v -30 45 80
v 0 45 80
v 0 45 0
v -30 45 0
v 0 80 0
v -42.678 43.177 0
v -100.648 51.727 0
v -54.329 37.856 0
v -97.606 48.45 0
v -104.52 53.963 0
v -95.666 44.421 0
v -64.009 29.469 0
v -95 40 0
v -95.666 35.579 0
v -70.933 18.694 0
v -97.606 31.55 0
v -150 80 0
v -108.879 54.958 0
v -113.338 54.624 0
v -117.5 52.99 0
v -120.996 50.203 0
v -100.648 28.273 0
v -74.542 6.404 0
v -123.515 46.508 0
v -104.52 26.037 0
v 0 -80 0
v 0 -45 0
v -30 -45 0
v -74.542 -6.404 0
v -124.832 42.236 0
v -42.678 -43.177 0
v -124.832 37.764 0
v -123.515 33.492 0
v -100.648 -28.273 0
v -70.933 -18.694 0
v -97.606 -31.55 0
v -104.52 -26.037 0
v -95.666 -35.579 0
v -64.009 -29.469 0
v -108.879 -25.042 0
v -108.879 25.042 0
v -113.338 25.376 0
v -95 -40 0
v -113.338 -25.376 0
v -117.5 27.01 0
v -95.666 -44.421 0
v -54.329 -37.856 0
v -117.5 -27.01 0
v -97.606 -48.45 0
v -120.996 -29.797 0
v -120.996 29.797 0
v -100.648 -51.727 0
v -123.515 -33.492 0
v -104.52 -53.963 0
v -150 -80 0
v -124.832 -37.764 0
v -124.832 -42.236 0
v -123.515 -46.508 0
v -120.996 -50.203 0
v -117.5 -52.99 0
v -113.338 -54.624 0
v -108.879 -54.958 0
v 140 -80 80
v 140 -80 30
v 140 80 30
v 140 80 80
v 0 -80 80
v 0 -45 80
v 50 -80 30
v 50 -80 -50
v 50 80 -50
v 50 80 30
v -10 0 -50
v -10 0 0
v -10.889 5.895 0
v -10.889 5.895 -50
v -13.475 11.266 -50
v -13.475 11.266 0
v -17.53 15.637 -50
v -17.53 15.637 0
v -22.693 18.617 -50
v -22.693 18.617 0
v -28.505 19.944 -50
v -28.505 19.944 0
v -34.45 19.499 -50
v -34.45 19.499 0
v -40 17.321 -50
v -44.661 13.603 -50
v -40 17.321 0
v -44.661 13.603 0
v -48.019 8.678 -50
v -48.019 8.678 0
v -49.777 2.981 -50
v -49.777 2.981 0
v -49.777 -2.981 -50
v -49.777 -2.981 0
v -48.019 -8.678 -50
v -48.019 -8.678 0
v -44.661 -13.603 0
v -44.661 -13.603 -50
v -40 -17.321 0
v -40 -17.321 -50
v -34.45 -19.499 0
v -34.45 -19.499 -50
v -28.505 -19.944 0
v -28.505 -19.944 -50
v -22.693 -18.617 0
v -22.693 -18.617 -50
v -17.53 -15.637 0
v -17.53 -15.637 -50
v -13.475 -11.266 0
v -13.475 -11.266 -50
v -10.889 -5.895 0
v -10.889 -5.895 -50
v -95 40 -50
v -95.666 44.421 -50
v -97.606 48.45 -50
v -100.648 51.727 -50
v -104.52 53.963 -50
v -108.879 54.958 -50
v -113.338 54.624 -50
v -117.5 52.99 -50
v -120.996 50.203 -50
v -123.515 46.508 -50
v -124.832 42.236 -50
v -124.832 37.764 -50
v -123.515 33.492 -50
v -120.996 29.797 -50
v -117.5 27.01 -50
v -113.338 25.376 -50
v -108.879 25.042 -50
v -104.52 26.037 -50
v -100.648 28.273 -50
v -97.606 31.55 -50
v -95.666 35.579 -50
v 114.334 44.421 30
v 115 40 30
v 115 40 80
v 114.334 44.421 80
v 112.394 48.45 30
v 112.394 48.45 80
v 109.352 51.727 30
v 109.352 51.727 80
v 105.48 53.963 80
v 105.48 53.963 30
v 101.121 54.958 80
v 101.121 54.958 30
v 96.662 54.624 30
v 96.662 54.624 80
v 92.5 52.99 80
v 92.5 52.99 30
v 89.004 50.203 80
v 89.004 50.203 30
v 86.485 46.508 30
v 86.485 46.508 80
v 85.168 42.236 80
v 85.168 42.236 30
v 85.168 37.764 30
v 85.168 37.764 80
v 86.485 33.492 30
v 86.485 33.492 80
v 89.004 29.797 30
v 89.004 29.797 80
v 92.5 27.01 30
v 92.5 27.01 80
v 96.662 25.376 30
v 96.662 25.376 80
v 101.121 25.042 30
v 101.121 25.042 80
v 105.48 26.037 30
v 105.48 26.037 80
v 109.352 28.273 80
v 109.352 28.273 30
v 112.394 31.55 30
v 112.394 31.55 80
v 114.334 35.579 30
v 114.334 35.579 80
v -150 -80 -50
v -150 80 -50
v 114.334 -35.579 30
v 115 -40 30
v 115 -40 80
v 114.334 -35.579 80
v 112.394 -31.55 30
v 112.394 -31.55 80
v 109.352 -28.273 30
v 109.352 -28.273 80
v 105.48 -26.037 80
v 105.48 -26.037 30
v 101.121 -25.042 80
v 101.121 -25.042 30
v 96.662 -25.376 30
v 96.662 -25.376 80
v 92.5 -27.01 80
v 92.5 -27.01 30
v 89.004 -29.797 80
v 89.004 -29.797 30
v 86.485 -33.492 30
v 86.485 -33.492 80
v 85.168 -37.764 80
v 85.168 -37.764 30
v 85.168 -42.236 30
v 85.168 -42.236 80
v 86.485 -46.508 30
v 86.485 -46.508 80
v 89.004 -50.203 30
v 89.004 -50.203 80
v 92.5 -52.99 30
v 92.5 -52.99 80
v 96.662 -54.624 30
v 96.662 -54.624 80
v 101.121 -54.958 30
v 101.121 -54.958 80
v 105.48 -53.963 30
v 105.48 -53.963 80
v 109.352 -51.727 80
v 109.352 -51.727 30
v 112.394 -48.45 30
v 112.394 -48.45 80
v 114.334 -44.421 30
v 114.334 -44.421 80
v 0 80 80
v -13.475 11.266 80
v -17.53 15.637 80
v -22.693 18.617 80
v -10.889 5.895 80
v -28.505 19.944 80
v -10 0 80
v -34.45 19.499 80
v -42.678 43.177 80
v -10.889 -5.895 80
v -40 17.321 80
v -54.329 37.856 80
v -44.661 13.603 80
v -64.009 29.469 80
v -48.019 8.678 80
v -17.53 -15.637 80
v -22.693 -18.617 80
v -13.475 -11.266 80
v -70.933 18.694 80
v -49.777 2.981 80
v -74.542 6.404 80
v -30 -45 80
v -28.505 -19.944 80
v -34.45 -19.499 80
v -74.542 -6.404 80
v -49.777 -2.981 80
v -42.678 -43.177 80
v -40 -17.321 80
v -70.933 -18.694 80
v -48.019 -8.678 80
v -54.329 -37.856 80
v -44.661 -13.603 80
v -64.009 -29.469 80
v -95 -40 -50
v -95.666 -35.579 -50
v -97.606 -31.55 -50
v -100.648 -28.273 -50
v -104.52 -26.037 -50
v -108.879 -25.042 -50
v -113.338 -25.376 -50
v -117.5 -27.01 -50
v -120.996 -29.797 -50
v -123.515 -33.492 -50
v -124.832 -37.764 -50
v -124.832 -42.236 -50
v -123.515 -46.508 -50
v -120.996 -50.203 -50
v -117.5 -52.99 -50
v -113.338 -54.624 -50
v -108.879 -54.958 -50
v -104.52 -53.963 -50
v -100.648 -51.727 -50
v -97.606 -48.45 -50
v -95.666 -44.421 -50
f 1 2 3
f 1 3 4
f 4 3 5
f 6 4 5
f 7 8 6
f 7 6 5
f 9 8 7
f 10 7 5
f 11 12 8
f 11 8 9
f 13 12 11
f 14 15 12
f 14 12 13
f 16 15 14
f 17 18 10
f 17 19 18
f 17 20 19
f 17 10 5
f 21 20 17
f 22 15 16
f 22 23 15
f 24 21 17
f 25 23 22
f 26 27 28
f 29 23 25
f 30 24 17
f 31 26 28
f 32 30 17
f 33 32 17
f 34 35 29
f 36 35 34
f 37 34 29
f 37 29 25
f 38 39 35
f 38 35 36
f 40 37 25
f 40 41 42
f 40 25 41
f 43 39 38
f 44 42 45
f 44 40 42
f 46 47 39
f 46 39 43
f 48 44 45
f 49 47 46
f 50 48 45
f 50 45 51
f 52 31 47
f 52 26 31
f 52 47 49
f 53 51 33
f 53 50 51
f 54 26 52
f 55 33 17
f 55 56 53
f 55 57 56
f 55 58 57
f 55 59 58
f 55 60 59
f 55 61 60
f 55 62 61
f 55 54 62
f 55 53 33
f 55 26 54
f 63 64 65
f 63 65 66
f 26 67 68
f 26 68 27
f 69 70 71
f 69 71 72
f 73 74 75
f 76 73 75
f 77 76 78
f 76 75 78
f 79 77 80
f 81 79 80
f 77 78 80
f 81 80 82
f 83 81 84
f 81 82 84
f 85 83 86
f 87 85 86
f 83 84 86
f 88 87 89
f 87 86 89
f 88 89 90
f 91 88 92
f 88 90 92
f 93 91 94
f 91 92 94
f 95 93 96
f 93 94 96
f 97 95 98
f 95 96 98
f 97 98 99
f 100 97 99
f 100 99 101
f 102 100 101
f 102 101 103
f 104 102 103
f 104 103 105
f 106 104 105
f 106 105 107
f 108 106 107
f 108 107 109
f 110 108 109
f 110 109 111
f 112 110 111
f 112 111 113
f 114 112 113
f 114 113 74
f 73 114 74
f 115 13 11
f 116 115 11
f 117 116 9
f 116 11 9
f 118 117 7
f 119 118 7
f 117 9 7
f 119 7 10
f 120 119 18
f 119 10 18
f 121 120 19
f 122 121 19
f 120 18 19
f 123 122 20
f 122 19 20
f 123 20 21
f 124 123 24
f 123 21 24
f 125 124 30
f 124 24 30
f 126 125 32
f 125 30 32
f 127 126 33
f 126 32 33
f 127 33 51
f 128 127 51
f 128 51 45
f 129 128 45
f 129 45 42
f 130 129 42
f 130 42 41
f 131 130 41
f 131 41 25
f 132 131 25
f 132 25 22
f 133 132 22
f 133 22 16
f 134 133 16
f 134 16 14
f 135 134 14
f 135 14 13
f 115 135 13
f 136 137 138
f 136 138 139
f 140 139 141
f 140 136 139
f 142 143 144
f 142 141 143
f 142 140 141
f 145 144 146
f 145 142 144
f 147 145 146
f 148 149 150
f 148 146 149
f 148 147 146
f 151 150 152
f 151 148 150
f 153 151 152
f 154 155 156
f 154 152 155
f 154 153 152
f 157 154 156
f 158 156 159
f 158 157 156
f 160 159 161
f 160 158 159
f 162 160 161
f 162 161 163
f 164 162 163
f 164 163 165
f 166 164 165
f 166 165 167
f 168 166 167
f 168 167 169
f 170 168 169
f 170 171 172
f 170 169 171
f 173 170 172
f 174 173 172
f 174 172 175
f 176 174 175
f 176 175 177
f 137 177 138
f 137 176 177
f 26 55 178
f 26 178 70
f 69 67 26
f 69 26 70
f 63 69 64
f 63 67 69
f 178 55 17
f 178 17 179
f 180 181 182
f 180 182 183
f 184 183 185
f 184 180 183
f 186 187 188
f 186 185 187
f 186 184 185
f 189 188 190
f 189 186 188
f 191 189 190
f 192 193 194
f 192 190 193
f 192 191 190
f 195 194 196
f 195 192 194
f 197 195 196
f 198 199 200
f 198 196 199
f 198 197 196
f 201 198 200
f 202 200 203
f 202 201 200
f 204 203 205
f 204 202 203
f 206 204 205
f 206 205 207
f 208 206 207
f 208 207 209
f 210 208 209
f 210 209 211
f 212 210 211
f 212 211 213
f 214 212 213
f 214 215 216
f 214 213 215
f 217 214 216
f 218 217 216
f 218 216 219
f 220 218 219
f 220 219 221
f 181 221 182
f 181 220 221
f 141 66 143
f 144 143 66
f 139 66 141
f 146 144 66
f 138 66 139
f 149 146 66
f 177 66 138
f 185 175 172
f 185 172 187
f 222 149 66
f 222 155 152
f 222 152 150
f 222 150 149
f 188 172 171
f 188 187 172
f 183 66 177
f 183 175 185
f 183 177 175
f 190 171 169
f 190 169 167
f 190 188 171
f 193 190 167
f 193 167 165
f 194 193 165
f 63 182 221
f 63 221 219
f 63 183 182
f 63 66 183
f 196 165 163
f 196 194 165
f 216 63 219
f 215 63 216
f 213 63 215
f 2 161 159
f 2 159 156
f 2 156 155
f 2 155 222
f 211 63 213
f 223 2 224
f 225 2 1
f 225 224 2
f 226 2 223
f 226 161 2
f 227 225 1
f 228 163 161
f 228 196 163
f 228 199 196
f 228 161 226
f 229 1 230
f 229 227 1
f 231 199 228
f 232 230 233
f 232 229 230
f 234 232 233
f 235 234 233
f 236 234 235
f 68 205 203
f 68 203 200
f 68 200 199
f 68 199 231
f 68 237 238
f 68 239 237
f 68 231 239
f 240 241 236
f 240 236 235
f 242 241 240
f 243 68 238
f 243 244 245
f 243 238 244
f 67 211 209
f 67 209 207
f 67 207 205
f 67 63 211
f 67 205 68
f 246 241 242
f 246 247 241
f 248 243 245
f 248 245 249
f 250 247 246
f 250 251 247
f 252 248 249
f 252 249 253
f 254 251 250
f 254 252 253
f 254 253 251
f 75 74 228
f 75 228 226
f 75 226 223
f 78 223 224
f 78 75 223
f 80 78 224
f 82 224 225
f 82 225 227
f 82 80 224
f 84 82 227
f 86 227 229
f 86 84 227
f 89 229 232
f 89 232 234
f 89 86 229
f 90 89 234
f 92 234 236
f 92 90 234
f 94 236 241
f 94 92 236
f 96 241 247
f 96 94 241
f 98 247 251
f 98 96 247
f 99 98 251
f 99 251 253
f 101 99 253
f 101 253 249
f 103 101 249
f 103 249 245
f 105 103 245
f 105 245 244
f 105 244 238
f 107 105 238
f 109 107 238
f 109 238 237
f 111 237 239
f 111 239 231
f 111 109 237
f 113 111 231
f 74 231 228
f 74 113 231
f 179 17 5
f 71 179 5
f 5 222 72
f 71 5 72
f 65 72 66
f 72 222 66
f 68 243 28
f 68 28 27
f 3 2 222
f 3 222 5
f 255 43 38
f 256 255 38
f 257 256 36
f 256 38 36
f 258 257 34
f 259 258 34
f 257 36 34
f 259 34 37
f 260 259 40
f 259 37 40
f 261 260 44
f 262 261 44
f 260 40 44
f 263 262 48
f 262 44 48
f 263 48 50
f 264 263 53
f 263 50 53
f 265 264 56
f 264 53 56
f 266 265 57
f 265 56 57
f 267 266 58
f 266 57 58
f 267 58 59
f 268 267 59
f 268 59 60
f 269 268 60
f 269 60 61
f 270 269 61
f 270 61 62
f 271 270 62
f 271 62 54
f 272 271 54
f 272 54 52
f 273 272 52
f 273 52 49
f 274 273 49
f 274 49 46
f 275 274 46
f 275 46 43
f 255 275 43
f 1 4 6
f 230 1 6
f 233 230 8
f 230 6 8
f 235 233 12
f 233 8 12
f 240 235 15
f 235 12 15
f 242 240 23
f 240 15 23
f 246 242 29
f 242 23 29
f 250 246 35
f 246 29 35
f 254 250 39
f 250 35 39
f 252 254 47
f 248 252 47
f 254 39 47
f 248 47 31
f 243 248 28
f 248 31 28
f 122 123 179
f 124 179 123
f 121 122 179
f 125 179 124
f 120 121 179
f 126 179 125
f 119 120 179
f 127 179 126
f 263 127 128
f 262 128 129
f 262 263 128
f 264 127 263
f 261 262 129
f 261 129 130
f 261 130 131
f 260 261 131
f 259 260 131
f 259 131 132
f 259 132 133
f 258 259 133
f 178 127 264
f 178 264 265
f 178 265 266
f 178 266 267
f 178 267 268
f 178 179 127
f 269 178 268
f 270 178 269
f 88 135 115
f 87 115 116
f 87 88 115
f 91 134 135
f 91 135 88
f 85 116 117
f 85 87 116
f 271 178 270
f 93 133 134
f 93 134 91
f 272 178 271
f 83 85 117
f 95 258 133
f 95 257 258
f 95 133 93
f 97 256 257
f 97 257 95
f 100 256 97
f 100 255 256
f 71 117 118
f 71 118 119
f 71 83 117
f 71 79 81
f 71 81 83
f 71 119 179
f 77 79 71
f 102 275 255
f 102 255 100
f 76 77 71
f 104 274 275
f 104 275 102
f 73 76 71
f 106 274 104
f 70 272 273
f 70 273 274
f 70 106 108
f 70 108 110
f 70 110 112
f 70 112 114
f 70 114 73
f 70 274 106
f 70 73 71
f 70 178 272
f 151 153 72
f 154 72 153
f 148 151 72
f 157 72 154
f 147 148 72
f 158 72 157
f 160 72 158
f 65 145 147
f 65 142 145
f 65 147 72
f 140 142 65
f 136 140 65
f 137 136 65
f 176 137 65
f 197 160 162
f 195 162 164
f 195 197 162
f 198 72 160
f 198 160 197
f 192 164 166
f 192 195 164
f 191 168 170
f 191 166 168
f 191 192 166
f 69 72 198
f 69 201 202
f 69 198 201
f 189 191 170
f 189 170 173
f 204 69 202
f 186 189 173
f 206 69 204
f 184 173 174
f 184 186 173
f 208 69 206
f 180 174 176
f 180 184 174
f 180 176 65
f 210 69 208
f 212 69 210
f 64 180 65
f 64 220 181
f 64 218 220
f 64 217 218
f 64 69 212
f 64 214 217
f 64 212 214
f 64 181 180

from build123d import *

# Parameters (mm, degrees)
F1_DEPTH      = 80
F2_R          = 20
F3_DEPTH      = 80
F2_R_2        = 15
F4_DEPTH      = 50.001
F4_DEPTH_BACK = 80.001


with BuildPart() as f1:
    # F0 (on Front) → F1 (new body, symmetric)
    with BuildSketch(Plane.XZ):
        Polygon((0, 0), (-150, 0), (-150, -50), (50, -50), (50, 30), (140, 30), (140, 80), (0, 80), align=None)
    extrude(amount=F1_DEPTH, both=True)

    # F2 (on face) → F3 (join)
    with BuildSketch(Plane.XY):
        with BuildLine():
            Line((0, -45), (0, 45))
            Line((0, 45), (-30, 45))
            ThreePointArc((-30, 45), (-75, 0), (-30, -45))
            Line((-30, -45), (0, -45))
        make_face()
        with Locations((-30, 0)):
            Circle(F2_R, mode=Mode.SUBTRACT)
    extrude(amount=F3_DEPTH)

    # F2 (on face) → F4 (cut, two sides)
    with BuildSketch(Plane.XY) as f4_sk:
        with Locations((-110, 40)):
            Circle(F2_R_2)
        with Locations((-110, -40)):
            Circle(F2_R_2)
        with Locations((100, -40)):
            Circle(F2_R_2)
        with Locations((100, 40)):
            Circle(F2_R_2)
        with Locations((-30, 0)):
            Circle(F2_R)
    extrude(amount=-F4_DEPTH, mode=Mode.SUBTRACT)
    extrude(f4_sk.sketch, amount=F4_DEPTH_BACK, mode=Mode.SUBTRACT)


solid = f1.part
